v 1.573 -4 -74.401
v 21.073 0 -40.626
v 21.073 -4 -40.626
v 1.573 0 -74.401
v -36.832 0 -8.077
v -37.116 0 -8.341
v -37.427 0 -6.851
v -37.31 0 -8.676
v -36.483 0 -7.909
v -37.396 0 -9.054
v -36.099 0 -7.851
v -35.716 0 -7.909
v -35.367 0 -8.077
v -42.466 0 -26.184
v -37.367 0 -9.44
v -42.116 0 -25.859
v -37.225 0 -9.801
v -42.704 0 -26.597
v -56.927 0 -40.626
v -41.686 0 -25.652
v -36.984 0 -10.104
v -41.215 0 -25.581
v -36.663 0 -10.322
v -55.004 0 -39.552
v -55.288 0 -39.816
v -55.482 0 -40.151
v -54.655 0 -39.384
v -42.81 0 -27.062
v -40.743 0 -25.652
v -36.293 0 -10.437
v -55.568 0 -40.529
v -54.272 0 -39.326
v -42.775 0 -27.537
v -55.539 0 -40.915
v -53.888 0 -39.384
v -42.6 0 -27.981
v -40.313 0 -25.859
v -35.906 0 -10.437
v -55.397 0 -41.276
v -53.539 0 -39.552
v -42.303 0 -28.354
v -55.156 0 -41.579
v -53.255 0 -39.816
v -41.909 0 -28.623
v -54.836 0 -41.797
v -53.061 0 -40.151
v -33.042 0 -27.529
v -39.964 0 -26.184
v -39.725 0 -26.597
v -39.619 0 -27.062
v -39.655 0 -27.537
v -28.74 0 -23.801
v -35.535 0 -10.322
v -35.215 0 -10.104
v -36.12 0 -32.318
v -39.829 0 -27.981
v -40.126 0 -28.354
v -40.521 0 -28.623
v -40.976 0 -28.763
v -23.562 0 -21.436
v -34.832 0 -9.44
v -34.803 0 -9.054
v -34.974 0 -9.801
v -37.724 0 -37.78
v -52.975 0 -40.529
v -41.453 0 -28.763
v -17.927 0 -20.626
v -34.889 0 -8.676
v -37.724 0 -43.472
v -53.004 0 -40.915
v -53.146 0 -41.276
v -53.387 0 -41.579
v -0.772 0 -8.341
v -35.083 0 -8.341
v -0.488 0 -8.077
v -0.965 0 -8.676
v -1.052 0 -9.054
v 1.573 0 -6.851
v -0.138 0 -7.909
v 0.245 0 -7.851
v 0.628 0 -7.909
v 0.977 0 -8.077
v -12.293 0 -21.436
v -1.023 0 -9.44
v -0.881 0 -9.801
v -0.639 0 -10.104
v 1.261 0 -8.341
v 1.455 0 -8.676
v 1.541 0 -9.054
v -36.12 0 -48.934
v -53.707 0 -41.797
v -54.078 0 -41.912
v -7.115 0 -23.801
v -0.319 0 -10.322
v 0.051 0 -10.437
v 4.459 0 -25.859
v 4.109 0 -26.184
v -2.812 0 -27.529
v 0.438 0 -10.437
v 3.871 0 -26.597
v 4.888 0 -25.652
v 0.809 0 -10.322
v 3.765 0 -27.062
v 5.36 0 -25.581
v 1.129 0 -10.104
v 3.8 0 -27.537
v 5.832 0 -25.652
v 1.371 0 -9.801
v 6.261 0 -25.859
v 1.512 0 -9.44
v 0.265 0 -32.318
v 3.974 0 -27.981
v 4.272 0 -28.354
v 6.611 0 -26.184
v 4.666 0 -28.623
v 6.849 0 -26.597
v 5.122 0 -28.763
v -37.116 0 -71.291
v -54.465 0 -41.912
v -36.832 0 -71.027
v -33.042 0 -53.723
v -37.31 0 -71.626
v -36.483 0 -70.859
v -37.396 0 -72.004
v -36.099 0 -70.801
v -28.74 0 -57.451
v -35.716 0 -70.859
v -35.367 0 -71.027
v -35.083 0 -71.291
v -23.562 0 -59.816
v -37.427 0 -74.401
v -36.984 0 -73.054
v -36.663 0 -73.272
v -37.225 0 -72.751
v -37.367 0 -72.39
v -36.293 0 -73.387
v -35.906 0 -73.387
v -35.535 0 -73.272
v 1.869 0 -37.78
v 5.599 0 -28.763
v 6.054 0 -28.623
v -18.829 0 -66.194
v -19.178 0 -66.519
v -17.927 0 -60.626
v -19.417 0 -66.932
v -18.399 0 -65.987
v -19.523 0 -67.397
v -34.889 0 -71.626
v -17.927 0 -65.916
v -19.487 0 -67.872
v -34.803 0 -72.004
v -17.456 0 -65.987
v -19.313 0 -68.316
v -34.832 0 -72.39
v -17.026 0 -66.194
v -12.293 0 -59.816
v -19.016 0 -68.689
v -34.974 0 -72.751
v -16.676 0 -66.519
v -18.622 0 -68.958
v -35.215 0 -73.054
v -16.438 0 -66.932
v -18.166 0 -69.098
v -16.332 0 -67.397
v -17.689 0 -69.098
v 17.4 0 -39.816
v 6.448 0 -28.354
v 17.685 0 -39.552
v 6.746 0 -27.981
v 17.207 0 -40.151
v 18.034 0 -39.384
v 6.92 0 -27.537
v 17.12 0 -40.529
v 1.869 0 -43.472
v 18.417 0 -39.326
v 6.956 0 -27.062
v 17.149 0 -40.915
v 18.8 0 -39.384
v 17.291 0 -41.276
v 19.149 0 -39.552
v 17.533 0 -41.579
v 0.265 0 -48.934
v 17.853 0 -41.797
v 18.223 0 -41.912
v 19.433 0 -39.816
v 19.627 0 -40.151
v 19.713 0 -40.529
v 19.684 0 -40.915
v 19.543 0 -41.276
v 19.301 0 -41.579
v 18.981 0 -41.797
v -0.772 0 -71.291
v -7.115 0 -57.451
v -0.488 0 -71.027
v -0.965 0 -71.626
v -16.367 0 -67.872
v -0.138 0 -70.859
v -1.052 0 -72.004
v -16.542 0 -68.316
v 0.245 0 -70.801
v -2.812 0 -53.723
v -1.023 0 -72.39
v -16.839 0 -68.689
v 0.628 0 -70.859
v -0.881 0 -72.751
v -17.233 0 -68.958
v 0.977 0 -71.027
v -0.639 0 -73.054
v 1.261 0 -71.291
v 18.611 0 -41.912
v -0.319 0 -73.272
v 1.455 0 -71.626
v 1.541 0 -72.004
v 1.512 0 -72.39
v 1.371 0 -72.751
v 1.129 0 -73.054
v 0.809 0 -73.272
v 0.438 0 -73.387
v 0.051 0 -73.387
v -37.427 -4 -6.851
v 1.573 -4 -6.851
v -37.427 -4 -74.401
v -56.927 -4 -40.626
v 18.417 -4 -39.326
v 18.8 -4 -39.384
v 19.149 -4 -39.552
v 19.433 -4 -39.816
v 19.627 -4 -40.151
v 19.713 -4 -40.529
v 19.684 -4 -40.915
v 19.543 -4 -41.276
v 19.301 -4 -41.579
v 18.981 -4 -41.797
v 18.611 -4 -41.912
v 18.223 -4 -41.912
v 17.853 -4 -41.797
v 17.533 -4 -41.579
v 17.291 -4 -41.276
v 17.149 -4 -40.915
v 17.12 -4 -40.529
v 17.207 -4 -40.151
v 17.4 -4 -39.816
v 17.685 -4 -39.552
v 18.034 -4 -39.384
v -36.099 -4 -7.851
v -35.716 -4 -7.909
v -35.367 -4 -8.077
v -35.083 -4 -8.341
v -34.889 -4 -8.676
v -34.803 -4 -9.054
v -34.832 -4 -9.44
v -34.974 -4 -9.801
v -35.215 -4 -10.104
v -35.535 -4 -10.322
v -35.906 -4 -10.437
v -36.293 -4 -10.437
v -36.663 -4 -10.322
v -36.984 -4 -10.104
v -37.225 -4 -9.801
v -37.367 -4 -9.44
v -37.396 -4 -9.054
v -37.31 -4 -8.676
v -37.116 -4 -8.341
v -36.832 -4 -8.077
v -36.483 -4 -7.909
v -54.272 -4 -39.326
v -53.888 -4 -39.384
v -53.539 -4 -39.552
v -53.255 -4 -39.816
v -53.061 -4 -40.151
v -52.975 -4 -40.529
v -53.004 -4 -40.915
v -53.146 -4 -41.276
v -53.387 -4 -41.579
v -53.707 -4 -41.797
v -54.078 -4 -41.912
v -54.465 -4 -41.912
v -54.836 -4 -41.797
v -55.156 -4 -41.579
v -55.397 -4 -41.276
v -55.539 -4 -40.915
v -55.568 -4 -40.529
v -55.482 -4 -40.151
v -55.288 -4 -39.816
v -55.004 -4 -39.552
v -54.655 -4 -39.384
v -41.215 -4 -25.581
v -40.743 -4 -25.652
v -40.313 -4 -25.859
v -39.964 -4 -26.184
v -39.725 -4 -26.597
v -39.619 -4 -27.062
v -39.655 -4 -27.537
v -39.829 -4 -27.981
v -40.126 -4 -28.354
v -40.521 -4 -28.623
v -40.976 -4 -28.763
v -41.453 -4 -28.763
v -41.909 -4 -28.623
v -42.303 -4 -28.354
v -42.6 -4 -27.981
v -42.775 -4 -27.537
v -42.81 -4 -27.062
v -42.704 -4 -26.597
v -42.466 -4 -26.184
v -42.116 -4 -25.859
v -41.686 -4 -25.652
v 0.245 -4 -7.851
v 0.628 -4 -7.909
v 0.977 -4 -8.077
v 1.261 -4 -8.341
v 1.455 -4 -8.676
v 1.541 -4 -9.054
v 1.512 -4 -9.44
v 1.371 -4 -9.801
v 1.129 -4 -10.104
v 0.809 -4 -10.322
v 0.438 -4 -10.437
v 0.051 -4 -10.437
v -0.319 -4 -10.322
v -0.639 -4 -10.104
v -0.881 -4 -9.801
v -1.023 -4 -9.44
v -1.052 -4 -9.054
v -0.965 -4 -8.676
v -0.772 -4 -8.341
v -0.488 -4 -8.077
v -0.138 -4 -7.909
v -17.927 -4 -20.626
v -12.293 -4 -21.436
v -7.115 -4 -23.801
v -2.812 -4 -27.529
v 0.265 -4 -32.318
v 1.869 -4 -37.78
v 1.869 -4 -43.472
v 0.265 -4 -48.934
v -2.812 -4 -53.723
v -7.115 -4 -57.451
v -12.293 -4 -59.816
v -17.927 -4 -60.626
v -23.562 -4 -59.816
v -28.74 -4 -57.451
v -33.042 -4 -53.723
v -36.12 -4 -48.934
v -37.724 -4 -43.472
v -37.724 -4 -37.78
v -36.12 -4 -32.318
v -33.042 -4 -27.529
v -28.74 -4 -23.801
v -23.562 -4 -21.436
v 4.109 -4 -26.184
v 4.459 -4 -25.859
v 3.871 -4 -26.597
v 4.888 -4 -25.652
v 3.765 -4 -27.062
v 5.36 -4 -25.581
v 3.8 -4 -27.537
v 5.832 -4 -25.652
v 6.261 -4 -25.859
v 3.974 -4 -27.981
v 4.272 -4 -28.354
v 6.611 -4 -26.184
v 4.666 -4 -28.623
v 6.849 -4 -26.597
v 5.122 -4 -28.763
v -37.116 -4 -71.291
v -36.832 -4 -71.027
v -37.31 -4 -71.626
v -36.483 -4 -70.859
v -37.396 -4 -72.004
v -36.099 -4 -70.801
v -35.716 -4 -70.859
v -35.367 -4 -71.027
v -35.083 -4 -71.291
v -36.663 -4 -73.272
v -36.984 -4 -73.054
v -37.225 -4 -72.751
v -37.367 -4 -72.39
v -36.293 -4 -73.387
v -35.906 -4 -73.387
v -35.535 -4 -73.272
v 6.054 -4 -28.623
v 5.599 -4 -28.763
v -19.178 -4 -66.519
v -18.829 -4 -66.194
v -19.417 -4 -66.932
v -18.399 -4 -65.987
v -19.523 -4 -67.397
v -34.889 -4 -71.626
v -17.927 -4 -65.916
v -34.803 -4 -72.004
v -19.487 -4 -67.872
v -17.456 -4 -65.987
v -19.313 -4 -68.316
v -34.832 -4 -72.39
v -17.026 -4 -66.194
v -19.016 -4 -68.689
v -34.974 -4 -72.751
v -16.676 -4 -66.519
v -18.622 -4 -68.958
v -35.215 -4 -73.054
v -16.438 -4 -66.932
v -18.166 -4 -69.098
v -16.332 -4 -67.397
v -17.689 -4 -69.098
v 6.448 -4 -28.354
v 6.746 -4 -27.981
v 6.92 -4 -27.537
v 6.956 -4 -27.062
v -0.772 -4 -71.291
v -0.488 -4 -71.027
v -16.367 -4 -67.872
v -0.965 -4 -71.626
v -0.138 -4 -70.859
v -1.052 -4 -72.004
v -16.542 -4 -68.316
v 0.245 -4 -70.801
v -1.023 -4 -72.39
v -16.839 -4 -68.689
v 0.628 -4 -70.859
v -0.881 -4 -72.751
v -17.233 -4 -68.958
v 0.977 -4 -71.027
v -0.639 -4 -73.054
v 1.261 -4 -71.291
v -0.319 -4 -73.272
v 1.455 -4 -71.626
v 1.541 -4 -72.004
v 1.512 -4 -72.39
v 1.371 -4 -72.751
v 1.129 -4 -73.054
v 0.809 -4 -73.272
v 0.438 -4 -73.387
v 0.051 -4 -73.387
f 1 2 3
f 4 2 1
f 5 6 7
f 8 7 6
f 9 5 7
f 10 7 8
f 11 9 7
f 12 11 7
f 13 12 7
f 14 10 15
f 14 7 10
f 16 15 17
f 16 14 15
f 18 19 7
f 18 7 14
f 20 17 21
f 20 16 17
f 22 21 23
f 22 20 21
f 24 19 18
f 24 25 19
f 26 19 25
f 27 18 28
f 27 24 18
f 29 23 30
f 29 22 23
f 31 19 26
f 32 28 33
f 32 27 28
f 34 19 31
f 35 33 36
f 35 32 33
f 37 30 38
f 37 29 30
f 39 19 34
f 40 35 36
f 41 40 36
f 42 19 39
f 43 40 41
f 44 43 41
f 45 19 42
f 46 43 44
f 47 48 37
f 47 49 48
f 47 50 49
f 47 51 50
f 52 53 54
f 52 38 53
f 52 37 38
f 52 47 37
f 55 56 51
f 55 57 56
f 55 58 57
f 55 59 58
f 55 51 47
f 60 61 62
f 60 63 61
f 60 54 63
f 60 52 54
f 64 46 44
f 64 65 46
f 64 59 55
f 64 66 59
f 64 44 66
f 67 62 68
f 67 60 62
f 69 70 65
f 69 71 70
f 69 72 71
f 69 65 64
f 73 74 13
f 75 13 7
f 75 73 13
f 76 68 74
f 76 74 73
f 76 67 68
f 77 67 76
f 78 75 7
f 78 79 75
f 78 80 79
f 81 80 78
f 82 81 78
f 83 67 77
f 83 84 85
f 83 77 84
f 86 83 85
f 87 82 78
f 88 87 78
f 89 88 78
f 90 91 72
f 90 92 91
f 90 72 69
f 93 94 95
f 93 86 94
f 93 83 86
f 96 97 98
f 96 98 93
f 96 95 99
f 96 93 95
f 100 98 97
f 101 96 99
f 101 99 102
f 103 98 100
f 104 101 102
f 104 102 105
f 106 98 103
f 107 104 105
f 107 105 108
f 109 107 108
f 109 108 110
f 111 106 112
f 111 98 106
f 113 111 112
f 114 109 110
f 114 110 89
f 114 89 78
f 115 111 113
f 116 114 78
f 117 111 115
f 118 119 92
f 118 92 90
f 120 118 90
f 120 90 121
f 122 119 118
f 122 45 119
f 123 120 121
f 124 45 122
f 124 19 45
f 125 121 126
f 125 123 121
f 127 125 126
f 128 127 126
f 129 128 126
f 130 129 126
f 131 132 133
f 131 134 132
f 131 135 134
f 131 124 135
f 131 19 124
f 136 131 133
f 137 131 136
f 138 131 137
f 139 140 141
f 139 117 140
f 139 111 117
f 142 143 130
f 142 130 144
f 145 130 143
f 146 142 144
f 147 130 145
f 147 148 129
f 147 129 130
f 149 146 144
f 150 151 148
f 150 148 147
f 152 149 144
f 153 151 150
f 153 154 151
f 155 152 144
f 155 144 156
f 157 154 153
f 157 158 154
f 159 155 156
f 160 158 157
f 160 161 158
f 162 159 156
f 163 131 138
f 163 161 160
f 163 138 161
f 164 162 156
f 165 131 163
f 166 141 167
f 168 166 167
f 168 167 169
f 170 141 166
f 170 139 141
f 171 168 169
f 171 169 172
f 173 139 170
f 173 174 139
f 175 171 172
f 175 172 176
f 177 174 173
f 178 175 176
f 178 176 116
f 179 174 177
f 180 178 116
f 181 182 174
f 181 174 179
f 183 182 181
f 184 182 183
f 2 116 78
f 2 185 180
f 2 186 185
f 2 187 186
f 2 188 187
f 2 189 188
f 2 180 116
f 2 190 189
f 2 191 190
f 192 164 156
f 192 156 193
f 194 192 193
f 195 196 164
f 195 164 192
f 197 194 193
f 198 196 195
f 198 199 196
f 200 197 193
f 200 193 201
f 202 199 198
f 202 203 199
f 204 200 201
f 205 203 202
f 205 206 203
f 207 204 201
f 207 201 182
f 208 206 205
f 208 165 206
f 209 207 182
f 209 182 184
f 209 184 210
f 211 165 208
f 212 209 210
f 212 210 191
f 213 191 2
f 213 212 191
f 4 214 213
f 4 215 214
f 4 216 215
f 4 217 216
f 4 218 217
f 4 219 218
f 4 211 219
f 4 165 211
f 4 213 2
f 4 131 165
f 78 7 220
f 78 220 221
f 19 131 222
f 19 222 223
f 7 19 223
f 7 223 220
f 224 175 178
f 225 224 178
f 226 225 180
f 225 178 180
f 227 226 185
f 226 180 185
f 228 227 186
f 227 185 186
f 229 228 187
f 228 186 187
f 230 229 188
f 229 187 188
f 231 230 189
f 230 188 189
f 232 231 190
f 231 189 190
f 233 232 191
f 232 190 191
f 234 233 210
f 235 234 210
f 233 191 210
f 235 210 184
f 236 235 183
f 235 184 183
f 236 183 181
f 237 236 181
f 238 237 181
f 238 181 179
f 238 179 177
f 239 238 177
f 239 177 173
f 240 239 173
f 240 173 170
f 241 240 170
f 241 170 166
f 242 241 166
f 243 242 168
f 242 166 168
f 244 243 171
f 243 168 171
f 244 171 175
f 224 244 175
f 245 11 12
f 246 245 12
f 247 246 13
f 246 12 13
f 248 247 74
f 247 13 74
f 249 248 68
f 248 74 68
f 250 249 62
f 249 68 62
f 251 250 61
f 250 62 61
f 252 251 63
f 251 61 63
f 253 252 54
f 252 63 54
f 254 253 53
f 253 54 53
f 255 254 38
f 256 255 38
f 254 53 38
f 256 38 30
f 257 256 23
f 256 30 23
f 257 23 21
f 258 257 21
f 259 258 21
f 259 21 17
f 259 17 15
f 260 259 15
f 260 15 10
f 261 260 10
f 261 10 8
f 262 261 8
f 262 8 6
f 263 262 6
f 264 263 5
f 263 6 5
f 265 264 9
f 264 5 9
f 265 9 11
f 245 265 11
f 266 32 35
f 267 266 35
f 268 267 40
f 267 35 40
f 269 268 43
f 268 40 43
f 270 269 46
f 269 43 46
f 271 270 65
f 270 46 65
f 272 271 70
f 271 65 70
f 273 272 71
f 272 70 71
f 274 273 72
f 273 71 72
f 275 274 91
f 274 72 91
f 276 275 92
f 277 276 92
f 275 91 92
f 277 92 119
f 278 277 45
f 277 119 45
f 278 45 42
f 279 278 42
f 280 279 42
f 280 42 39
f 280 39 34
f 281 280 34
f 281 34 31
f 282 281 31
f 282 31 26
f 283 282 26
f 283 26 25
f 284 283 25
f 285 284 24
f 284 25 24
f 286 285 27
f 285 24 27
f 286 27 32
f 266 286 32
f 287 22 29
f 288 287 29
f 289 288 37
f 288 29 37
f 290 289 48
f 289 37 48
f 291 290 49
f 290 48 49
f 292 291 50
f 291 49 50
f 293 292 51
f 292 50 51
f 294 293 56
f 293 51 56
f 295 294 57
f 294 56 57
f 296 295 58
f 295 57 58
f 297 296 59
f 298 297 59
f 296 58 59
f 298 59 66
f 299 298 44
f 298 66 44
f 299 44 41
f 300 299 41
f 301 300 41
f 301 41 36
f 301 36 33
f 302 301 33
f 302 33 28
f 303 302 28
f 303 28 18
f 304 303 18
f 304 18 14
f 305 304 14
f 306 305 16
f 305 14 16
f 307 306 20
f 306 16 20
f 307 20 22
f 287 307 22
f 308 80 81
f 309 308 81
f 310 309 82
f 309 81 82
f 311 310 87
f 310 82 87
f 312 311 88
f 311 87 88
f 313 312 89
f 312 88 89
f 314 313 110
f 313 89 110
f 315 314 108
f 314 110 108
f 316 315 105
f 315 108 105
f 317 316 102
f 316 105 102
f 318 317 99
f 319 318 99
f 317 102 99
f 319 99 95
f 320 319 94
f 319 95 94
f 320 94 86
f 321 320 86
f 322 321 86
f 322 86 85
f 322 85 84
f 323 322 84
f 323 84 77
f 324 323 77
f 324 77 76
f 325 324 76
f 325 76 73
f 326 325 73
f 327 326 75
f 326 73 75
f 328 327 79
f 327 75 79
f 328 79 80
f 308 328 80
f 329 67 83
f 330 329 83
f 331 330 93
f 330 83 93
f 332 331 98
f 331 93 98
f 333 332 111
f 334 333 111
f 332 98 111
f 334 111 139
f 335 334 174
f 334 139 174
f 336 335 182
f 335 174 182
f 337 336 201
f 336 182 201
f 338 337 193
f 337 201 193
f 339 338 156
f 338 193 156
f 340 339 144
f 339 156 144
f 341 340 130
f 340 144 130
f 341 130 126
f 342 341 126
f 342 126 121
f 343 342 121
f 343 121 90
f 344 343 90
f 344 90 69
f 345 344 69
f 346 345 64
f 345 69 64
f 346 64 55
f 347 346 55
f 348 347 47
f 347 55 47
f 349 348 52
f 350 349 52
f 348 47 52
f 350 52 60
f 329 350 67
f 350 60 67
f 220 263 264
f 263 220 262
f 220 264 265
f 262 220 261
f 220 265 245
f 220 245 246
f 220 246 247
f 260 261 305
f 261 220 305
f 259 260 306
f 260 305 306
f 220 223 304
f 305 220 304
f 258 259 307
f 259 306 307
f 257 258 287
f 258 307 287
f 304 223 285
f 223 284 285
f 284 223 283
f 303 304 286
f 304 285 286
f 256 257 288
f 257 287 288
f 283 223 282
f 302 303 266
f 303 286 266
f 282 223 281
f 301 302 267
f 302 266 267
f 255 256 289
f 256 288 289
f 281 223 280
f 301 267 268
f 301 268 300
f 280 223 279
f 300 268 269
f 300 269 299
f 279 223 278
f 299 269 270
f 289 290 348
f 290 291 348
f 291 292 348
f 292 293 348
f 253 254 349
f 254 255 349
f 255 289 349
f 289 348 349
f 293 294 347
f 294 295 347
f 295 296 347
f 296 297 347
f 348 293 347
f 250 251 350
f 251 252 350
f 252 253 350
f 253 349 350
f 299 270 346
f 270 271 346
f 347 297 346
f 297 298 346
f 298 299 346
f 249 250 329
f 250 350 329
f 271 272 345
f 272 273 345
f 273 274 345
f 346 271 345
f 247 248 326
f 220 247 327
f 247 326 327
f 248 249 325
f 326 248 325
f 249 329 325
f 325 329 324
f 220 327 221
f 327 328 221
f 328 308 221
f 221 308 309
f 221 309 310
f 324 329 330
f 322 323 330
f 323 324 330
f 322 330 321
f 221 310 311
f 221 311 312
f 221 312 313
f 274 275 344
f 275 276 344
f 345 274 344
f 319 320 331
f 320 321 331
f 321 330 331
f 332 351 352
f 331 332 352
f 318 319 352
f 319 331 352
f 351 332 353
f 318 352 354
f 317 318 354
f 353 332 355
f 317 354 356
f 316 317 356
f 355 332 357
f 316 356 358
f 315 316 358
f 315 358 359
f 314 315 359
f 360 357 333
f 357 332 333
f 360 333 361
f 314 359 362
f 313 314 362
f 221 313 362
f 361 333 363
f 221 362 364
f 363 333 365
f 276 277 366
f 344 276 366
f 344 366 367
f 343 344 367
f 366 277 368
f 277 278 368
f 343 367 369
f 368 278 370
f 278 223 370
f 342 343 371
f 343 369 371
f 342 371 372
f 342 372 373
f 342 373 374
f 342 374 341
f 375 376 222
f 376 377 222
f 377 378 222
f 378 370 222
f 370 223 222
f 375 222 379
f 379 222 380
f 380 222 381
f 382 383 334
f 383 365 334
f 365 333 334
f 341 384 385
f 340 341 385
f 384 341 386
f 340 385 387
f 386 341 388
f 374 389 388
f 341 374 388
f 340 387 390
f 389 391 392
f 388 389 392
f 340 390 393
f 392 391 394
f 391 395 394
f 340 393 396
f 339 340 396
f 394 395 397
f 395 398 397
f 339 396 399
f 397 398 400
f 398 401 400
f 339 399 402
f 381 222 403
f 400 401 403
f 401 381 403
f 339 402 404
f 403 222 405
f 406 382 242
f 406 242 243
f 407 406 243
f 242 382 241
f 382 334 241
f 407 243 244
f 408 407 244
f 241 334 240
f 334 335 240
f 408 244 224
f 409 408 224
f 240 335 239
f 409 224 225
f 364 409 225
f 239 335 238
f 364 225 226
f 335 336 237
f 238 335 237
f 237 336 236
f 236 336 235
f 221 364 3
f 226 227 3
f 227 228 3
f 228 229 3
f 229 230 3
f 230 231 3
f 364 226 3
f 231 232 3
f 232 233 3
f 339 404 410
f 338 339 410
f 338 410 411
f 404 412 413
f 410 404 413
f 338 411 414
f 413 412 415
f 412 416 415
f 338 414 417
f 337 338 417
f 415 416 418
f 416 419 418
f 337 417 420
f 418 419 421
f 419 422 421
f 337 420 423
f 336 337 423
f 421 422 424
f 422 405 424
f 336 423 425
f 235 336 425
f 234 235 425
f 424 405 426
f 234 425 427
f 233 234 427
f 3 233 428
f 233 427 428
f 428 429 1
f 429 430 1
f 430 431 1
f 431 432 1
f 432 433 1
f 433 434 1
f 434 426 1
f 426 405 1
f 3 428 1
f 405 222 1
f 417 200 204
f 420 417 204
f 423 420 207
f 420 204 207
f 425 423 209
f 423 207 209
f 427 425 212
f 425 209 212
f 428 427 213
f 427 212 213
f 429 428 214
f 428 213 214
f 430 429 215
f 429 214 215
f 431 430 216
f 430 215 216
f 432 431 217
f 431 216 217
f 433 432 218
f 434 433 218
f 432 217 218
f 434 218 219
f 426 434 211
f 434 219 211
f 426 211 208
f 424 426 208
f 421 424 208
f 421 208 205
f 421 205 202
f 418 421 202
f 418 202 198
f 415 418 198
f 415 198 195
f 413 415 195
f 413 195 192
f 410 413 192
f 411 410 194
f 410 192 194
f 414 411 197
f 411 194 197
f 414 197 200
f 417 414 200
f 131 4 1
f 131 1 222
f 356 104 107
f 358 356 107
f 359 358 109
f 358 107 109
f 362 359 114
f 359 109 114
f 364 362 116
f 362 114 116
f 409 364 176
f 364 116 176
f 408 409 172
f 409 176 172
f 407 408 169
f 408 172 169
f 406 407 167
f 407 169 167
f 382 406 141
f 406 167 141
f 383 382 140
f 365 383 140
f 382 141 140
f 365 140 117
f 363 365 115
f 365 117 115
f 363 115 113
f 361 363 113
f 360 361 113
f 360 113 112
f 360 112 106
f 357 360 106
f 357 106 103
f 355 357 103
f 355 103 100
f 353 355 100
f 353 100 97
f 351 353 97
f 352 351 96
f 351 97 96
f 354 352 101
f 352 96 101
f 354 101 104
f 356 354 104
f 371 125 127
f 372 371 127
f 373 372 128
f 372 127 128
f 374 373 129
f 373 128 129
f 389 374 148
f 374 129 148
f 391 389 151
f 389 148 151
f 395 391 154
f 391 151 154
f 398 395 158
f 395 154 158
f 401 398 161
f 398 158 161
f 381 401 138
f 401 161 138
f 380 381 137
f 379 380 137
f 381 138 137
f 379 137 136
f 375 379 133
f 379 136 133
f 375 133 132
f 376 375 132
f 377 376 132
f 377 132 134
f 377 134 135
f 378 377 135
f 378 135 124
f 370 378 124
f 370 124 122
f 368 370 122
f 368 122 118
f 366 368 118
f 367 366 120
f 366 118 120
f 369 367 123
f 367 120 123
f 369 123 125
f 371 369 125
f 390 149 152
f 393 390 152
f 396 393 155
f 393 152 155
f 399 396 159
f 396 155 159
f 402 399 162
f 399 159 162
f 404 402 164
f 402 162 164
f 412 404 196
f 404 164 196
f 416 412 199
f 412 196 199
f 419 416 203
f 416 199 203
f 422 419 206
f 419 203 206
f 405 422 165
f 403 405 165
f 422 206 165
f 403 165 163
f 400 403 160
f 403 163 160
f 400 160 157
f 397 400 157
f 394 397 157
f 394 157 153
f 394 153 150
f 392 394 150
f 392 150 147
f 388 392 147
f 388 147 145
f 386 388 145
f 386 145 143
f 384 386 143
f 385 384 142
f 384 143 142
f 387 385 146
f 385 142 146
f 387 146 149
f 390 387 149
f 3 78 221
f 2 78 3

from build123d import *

# Parameters (mm, degrees)
BOSS_EXTRUDE1_DEPTH = 4
SKETCH3_R           = 20
CUT_EXTRUDE1_DEPTH  = 4
SKETCH4_R           = 1.6
SKETCH4_R_2         = 1.3
CUT_EXTRUDE2_DEPTH  = 4


with BuildPart() as part:
    # Sketch2 → Boss-Extrude1 (new body)
    with BuildSketch(Plane(origin=(0, 0, 0), x_dir=(1, 0, 0), z_dir=(0, 1, 0))):
        Polygon((1.572650536, 74.401195204), (-37.427349464, 74.401195204), (-56.927349464, 40.626204456), (-37.427349464, 6.851213708), (1.572650536, 6.851213708), (21.072650536, 40.626204456), align=None)
    extrude(amount=-BOSS_EXTRUDE1_DEPTH)

    # Sketch3 → Cut-Extrude1 (cut)
    with BuildSketch(Plane(origin=(0, 0, 0), x_dir=(1, 0, 0), z_dir=(0, 1, 0))):
        with Locations(Location((-17.927354806, 40.626195204, 0), (0, 0, 270))):
            Circle(SKETCH3_R)
    extrude(amount=-CUT_EXTRUDE1_DEPTH, mode=Mode.SUBTRACT)

    # Sketch4 → Cut-Extrude2 (cut)
    with BuildSketch(Plane(origin=(0, 0, 0), x_dir=(1, 0, 0), z_dir=(0, 1, 0))):
        with Locations(Location((5.360065631, 27.181209082, 0), (0, 0, 270))):
            Circle(SKETCH4_R)
        with Locations(Location((0.244744901, 9.15121368, 0), (0, 0, 270))):
            Circle(SKETCH4_R_2)
        with Locations(Location((-36.099443845, 9.151213708, 0), (0, 0, 270))):
            Circle(SKETCH4_R_2)
        with Locations(Location((-41.214764559, 27.181190577, 0), (0, 0, 270))):
            Circle(SKETCH4_R)
        with Locations(Location((-17.927365489, 67.516185951, 0), (0, 0, 270))):
            Circle(SKETCH4_R)
        with Locations(Location((18.416839298, 40.626204456, 0), (0, 0, 270))):
            Circle(SKETCH4_R_2)
        with Locations(Location((0.244744917, 72.101195204, 0), (0, 0, 270))):
            Circle(SKETCH4_R_2)
        with Locations(Location((-54.271538226, 40.626204456, 0), (0, 0, 270))):
            Circle(SKETCH4_R_2)
        with Locations(Location((-36.099443845, 72.101195204, 0), (0, 0, 270))):
            Circle(SKETCH4_R_2)
    extrude(amount=-CUT_EXTRUDE2_DEPTH, mode=Mode.SUBTRACT)


solid = part.part
